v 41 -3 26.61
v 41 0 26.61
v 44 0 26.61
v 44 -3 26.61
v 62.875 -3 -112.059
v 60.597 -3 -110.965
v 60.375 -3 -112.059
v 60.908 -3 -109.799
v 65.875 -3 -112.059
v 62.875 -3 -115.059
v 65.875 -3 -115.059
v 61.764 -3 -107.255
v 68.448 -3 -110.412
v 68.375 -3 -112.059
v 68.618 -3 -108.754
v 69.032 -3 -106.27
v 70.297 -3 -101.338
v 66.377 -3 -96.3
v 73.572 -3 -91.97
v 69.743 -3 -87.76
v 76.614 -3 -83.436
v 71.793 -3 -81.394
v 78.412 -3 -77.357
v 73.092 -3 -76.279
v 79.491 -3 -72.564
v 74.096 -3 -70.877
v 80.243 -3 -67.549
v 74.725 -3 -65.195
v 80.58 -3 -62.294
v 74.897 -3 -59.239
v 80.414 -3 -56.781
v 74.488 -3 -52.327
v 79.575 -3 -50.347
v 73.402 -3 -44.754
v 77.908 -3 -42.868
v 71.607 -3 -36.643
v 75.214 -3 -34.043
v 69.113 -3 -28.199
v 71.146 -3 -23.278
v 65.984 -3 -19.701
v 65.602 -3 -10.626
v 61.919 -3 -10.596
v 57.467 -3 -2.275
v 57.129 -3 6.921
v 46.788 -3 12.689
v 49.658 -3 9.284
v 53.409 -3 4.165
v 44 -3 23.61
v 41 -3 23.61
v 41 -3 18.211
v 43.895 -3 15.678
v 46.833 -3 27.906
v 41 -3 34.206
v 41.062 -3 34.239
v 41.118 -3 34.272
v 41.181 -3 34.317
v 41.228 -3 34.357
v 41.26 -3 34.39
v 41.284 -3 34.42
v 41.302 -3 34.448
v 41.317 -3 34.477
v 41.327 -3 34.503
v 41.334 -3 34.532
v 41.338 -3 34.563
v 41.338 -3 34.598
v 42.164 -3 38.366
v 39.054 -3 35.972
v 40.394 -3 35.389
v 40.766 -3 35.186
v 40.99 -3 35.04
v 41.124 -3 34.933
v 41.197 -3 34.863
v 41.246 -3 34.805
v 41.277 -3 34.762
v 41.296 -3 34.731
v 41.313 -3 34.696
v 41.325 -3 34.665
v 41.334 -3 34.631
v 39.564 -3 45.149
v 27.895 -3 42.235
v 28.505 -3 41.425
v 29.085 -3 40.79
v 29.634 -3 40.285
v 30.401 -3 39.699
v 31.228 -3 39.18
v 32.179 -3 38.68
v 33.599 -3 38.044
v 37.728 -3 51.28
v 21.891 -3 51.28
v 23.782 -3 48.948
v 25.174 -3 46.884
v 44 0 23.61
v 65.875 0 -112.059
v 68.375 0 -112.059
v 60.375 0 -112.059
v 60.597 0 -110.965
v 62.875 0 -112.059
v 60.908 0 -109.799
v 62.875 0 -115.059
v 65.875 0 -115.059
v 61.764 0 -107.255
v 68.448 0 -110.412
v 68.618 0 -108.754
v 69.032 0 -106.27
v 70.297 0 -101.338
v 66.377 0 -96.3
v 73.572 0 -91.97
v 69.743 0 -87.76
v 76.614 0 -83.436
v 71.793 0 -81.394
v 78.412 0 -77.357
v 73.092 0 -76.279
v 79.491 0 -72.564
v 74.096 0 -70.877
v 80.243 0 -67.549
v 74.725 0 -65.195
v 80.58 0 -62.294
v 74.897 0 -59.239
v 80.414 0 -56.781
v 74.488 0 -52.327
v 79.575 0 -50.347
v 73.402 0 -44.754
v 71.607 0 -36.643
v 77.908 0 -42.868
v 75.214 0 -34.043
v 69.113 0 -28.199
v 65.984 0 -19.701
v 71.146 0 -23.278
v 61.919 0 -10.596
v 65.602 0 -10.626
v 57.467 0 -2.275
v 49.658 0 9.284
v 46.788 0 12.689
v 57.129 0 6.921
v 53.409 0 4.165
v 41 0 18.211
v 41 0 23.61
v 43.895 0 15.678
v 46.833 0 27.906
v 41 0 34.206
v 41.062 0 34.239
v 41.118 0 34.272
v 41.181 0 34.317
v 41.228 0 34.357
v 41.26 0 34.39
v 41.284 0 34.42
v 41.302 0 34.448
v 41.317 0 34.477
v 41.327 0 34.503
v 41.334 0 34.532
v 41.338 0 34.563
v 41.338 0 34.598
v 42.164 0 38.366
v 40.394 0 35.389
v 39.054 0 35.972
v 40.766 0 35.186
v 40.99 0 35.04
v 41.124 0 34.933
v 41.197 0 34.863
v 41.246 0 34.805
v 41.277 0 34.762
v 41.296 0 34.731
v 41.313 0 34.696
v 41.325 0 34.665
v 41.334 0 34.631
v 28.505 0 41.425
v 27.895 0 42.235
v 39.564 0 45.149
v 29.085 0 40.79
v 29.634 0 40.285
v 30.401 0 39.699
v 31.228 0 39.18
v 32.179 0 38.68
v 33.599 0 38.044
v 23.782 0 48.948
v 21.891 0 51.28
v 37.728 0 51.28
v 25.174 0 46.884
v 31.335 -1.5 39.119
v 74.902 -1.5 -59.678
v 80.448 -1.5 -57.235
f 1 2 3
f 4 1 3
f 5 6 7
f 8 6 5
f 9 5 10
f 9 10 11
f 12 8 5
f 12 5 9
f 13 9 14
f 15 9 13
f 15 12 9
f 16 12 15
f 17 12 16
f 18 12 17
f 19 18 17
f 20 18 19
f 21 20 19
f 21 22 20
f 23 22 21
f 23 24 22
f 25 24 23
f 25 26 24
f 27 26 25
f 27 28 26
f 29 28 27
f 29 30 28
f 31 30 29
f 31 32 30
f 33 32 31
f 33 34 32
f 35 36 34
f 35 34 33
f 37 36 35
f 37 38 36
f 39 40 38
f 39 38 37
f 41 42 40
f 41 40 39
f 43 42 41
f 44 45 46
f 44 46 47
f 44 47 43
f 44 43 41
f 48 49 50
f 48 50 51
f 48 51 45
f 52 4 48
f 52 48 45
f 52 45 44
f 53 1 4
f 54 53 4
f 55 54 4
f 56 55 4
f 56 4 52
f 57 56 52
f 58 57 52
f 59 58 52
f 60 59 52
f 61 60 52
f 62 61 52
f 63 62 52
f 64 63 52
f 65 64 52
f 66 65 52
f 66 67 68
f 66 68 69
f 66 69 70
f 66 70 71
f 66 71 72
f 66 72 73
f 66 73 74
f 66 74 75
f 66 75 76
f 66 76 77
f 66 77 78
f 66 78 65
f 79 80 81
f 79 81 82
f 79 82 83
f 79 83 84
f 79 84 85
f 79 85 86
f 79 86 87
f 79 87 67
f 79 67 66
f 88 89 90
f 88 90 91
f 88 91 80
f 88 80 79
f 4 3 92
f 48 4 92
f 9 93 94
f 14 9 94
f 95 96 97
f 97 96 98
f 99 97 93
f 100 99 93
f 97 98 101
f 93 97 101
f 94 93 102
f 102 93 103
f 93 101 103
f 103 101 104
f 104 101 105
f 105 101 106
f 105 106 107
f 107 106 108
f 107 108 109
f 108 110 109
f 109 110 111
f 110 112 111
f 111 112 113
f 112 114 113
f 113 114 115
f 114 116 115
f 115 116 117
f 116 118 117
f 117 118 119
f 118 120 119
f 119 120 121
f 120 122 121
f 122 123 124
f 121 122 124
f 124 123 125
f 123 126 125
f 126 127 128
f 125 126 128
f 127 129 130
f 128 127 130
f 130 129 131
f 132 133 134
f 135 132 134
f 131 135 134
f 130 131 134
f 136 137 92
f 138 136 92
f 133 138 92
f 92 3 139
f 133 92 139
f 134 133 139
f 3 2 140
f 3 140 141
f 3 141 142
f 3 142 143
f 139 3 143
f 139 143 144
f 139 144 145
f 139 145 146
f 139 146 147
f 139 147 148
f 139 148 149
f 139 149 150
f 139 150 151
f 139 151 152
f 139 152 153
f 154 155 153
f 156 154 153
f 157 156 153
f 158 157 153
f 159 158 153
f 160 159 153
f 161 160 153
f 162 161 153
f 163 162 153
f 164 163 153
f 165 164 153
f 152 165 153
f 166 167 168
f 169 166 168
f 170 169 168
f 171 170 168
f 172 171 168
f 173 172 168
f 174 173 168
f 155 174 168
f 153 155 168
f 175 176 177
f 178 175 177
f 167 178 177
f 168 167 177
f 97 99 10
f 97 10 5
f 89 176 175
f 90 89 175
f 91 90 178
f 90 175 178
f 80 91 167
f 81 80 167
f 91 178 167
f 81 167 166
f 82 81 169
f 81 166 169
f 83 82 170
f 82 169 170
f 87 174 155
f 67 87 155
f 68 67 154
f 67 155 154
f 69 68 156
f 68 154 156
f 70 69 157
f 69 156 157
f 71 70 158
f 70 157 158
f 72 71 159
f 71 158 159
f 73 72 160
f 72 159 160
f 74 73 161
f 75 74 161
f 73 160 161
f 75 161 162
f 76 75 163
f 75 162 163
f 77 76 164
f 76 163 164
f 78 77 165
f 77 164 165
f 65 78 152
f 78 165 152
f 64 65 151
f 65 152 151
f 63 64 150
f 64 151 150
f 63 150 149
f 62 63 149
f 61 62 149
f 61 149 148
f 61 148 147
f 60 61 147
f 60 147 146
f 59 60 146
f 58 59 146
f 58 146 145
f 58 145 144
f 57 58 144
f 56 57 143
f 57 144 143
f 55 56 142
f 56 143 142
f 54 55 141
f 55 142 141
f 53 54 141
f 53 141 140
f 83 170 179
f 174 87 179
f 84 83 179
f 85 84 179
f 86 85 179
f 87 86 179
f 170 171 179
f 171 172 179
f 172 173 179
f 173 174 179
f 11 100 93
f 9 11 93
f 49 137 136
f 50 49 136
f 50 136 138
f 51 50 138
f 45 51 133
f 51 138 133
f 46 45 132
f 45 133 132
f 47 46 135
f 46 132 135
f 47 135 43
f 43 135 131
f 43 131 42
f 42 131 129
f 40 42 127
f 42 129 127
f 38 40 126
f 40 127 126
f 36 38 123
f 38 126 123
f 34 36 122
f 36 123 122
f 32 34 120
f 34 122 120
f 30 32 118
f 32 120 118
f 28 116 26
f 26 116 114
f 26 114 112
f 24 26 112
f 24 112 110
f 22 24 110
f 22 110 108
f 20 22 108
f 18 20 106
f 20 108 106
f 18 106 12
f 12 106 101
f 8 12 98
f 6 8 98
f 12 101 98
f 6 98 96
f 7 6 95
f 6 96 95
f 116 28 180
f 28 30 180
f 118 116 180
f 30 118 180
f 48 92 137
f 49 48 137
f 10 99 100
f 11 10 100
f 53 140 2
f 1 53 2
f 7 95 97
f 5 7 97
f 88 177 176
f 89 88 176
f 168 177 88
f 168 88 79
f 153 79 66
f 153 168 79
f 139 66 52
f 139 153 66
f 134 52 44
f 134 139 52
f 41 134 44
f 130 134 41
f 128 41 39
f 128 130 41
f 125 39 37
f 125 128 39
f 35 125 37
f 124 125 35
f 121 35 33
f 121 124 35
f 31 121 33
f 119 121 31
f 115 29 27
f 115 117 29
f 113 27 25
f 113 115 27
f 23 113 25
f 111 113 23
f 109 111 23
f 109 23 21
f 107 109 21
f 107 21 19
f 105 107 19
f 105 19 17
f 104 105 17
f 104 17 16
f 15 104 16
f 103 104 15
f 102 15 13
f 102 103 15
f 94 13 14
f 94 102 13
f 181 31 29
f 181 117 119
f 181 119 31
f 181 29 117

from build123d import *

# Parameters (mm, degrees)
F1_DEPTH = 3
F2_W     = 3
F2_H     = 3
F3_DEPTH = 3


with BuildPart() as f1:
    # F0 (on Front) → F1 (new body)
    with BuildSketch(Plane.XZ):
        with BuildLine():
            Line((37.7275831997, 51.2796007097), (21.8912921846, 51.2796007097))
            add(Edge.make_bspline(
                [(21.8912921846, 51.2796007097), (27.3185072373, 45.1657411064), (26.039388682, 38.8996476775), (43.0508547476, 35.2303709053), (41, 34.2057006066)],
                knots=[0, 0, 0, 0, 0.5437203888, 1, 1, 1, 1], degree=3))
            Line((41, 34.2057006066), (41, 26.6100899651))
            Line((41, 26.6100899651), (44, 26.6100899651))
            Line((44, 26.6100899651), (44, 23.6100899651))
            Line((44, 23.6100899651), (41, 23.6100899651))
            Line((41, 23.6100899651), (41, 18.211246145))
            add(Edge.make_bspline(
                [(41, 18.211246145), (57.3413741866, 5.2397402187), (89.9952397738, -63.9580892481), (61.936421338, -102.5987867584), (60.3752894402, -112.0587181645)],
                knots=[0.3091443125, 0.3091443125, 0.3091443125, 0.3091443125, 0.6762851886, 1, 1, 1, 1], degree=3))
            Line((60.3752894402, -112.0587181645), (68.3752894402, -112.0587181645))
            add(Edge.make_bspline(
                [(37.7275831997, 51.2796007097), (44.065497615, 25.2670443927), (101.6281908906, -57.2120908678), (68.5710443155, -96.9809014754), (68.3752894402, -112.0587181645)],
                knots=[0, 0, 0, 0, 0.5903877314, 1, 1, 1, 1], degree=3))
        make_face()
    extrude(amount=F1_DEPTH)

    # F2 (on Front) → F3 (join)
    with BuildSketch(Plane.XZ):
        with Locations((64.3752894402, -113.5587181645)):
            Rectangle(F2_W, F2_H)
    extrude(amount=F3_DEPTH)


solid = f1.part
